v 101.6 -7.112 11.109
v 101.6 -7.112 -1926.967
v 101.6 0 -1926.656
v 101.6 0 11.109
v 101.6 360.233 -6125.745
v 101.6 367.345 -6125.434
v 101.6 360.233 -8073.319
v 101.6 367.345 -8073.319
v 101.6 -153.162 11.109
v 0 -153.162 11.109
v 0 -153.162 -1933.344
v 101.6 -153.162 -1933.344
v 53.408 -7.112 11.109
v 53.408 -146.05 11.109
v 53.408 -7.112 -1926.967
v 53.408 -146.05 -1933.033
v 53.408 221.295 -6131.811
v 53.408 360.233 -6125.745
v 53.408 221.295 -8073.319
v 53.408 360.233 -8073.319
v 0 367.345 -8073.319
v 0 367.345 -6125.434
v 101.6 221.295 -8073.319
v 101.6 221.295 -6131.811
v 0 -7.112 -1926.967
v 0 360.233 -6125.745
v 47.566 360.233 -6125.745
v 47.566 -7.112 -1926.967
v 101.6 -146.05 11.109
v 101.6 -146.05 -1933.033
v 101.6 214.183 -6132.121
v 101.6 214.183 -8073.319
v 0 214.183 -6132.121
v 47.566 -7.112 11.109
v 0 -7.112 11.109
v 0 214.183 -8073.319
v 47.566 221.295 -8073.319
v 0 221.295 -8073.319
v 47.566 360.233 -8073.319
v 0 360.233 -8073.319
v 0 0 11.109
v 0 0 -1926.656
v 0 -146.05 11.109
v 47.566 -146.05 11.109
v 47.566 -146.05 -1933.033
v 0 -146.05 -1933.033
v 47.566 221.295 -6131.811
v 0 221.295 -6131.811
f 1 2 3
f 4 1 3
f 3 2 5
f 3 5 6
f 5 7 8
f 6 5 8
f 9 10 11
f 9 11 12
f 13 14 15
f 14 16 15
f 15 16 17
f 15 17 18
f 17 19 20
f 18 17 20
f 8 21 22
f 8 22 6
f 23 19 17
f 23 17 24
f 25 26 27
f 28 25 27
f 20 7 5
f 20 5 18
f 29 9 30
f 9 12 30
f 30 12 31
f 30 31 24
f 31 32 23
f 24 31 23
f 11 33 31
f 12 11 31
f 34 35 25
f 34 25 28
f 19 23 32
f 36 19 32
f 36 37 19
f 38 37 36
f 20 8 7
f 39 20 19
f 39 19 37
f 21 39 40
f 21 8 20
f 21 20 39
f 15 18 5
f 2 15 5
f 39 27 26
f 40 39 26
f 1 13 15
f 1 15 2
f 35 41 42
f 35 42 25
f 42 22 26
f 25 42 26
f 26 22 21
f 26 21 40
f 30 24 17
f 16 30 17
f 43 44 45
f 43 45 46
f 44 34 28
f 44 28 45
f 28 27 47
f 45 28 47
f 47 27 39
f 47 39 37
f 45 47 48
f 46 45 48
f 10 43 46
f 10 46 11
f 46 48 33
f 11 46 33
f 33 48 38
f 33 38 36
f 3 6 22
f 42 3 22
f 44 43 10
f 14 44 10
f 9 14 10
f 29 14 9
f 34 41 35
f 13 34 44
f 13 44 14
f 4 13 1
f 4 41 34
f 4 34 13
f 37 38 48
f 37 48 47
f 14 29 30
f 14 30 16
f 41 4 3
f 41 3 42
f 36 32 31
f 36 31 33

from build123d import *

# Parameters (mm, degrees)
BOSS_EXTRUDE1_DEPTH = 14.541598669
BOSS_EXTRUDE2_DEPTH = 11.109177684


with BuildPart() as part:
    # Sweep1: sweep along a path in Sketch2
    with BuildLine(Plane(origin=(0, 0, 0), x_dir=(0, 0, -1), z_dir=(1, 0, 0))) as sweep1_path:
        Line((0, -76.581240533), (1930, -76.581240533))
        Line((1930, -76.581240533), (6128.777671415, 290.764206382))
        Line((6128.777671415, 290.764206382), (8058.777671415, 290.764206382))
    # Sketch1 → Sweep1 (sweep)
    with BuildSketch(Plane.XY):
        Polygon((0, -0.000240533), (101.6, -0.000240533), (101.6, -7.112240533), (53.408035714, -7.112240533), (53.408035714, -146.050240533), (101.6, -146.050240533), (101.6, -153.162240533), (0, -153.162240533), (0, -146.050240533), (47.566035714, -146.050240533), (47.566035714, -7.112240533), (0, -7.112240533), align=None)
    sweep(path=sweep1_path.line, transition=Transition.RIGHT)

    # Sketch4 → Boss-Extrude1 (add)
    with BuildSketch(Plane(origin=(0, 0, -8058.777671415), x_dir=(-1, 0, 0), z_dir=(0, 0, -1))):
        Polygon((0, 360.233206382), (0, 367.345206382), (-101.6, 367.345206382), (-101.6, 360.233206382), (-53.408035714, 360.233206382), (-53.408035714, 221.295206382), (-101.6, 221.295206382), (-101.6, 214.183206382), (0, 214.183206382), (0, 221.295206382), (-47.566035714, 221.295206382), (-47.566035714, 360.233206382), align=None)
    extrude(amount=BOSS_EXTRUDE1_DEPTH)

    # Sketch5 → Boss-Extrude2 (add)
    with BuildSketch(Plane.XY):
        Polygon((0, -0.000240533), (0, -7.112240533), (47.566035714, -7.112240533), (47.566035714, -146.050240533), (0, -146.050240533), (0, -153.162240533), (101.6, -153.162240533), (101.6, -146.050240533), (53.408035714, -146.050240533), (53.408035714, -7.112240533), (101.6, -7.112240533), (101.6, -0.000240533), align=None)
    extrude(amount=BOSS_EXTRUDE2_DEPTH)


solid = part.part
